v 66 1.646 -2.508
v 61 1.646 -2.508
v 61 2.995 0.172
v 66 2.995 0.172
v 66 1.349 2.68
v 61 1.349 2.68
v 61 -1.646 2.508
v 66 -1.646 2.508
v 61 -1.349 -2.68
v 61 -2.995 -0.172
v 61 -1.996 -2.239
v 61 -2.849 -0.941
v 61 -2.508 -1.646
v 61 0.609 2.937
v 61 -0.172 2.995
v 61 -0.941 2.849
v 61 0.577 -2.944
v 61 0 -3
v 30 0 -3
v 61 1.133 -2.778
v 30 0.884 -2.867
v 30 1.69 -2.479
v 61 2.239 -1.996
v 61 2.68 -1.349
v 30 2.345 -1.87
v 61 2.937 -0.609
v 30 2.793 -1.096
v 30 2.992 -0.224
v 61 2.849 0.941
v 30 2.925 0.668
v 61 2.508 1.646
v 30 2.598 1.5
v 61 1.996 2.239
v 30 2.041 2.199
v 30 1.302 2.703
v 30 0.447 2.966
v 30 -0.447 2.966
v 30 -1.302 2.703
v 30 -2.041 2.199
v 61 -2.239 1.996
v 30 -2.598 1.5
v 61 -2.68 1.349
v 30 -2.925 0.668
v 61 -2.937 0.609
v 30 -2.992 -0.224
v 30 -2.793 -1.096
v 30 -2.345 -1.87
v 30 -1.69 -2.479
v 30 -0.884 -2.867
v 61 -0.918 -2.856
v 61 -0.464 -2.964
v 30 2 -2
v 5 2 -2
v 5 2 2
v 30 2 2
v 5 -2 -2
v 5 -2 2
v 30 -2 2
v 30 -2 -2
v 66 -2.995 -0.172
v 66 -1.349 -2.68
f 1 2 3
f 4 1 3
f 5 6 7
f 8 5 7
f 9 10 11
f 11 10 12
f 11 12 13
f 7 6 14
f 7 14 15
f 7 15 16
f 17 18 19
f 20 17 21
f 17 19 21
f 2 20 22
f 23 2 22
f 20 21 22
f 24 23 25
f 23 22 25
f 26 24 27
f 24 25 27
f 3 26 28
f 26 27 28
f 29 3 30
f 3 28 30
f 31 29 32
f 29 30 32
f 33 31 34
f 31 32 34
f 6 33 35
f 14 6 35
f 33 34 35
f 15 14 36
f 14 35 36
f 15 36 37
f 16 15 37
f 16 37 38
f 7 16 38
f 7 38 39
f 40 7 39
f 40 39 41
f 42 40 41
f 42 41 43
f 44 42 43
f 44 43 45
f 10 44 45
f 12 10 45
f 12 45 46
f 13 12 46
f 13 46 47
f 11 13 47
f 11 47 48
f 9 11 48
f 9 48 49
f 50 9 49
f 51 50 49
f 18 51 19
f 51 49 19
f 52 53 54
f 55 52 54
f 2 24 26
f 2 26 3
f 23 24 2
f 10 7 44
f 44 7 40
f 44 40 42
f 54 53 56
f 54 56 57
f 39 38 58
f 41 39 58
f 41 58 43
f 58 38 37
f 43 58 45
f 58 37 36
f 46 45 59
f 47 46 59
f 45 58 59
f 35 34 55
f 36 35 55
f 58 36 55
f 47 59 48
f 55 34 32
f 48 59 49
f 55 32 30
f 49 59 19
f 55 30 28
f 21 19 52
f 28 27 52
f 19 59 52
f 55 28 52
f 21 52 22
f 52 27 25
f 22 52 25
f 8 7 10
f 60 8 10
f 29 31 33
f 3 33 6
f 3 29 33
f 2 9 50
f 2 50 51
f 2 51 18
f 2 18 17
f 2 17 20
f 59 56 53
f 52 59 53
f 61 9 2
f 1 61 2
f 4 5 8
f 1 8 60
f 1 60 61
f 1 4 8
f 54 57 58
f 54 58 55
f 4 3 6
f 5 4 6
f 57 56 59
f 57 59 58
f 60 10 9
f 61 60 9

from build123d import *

# Parameters (mm, degrees)
SKETCH3_R           = 3
BOSS_EXTRUDE1_DEPTH = 31
BOSS_EXTRUDE4_DEPTH = 5
SKETCH18_W          = 4
SKETCH18_H          = 4
BOSS_EXTRUDE5_DEPTH = 30
SKETCH21_W          = 4
SKETCH21_H          = 4
CUT_EXTRUDE1_DEPTH  = 5


with BuildPart() as part:
    # Sketch1 → Loft1 section 0
    with BuildSketch(Plane(origin=(0, 0, 0), x_dir=(0, 0, -1), z_dir=(1, 0, 0))):
        with BuildLine():
            Line((-1, -1), (1, -1))
            Line((1, -1), (1, 1))
            Line((1, 1), (-1, 1))
            Line((-1, 1), (-1, -1))
        make_face()
    # Sketch2 → Loft1 section 1
    with BuildSketch(Plane(origin=(30, 0, 0), x_dir=(0, 0, -1), z_dir=(1, 0, 0))):
        with BuildLine():
            Line((-1, -1), (1, -1))
            Line((1, -1), (1, 1))
            Line((1, 1), (-1, 1))
            Line((-1, 1), (-1, -1))
        make_face()
    loft()

    # Sketch3 → Boss-Extrude1 (add)
    with BuildSketch(Plane(origin=(30, 0, 0), x_dir=(0, 0, -1), z_dir=(1, 0, 0))):
        Circle(SKETCH3_R)
    extrude(amount=BOSS_EXTRUDE1_DEPTH)

    # Sketch17 → Boss-Extrude4 (add)
    with BuildSketch(Plane(origin=(61, 0, 0), x_dir=(0, 0, -1), z_dir=(1, 0, 0))):
        Polygon((2.507905391, 1.646332454), (-0.171813033, 2.995076006), (-2.679718424, 1.348743552), (-2.507905391, -1.646332454), (0.171813033, -2.995076006), (2.679718424, -1.348743552), align=None)
    extrude(amount=BOSS_EXTRUDE4_DEPTH)

    # Sketch18 → Boss-Extrude5 (add)
    with BuildSketch(Plane.ZY):
        Rectangle(SKETCH18_W, SKETCH18_H)
    extrude(amount=-BOSS_EXTRUDE5_DEPTH)

    # Sketch21 → Cut-Extrude1 (cut)
    with BuildSketch(Plane.ZY):
        Rectangle(SKETCH21_W, SKETCH21_H)
    extrude(amount=-CUT_EXTRUDE1_DEPTH, mode=Mode.SUBTRACT)


solid = part.part
